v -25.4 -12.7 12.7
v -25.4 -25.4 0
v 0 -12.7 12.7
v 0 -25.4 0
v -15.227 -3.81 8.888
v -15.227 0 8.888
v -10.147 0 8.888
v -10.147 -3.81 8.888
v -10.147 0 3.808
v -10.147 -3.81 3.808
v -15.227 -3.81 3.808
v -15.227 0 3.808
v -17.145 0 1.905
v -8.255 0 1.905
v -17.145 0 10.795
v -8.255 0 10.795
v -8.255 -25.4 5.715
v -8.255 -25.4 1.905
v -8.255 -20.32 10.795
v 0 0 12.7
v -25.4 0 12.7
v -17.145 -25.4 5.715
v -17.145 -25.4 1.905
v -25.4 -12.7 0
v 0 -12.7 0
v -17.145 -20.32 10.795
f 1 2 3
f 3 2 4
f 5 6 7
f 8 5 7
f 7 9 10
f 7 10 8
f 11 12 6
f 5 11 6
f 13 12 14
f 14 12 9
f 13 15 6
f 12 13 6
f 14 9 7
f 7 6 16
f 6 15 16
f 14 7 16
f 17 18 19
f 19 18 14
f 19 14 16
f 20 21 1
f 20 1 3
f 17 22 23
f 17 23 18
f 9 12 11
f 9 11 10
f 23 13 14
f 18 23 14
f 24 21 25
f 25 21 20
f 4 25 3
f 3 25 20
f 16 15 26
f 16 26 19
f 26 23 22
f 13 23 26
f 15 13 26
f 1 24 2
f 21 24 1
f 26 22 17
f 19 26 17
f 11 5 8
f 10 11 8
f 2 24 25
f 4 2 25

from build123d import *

# Parameters (mm, degrees)
F0_W     = 25.4
F0_H     = 12.7
F1_DEPTH = 25.4
F2_SIZE  = 12.69999
F3_W     = 8.89
F3_H     = 8.89
F4_DEPTH = 25.4
F5_W     = 5.08
F5_H     = 5.08
F6_DEPTH = 3.81
F7_SIZE  = 5.08


# Not quite as in the source:
# - a fillet or chamfer is up to 0.001 mm smaller than in the source, because OpenCascade refuses the exact size


with BuildPart() as f1:
    # F0 (on Front) → F1 (new body)
    with BuildSketch(Plane.XZ):
        with Locations((-12.7, 6.35)):
            Rectangle(F0_W, F0_H)
    extrude(amount=F1_DEPTH)

    # F2 (size 12.7 in the source; OpenCascade refuses exactly that, so slightly less here)
    f2_edges = [f1.edges().sort_by_distance(p)[0] for p in [
        (-12.7, -25.4, 12.7),
        (-12.7, 0, 0),
    ]]
    chamfer(f2_edges, length=F2_SIZE)


with BuildPart() as f4:
    # F3 (on Front) → F4 (new body)
    with BuildSketch(Plane.XZ):
        with Locations((-12.7, 6.35)):
            Rectangle(F3_W, F3_H)
    extrude(amount=F4_DEPTH)

    # F5 (on face) → F6 (cut)
    with BuildSketch(Plane.XZ):
        with Locations((-12.6871485263, 6.3475929201)):
            Rectangle(F5_W, F5_H)
    extrude(amount=F6_DEPTH, mode=Mode.SUBTRACT)

    # F7
    f7_edges = [f4.edges().sort_by_distance(p)[0] for p in [
        (-12.7, -25.4, 10.795),
    ]]
    chamfer(f7_edges, length=F7_SIZE)


solid = Compound([f1.part, f4.part])
